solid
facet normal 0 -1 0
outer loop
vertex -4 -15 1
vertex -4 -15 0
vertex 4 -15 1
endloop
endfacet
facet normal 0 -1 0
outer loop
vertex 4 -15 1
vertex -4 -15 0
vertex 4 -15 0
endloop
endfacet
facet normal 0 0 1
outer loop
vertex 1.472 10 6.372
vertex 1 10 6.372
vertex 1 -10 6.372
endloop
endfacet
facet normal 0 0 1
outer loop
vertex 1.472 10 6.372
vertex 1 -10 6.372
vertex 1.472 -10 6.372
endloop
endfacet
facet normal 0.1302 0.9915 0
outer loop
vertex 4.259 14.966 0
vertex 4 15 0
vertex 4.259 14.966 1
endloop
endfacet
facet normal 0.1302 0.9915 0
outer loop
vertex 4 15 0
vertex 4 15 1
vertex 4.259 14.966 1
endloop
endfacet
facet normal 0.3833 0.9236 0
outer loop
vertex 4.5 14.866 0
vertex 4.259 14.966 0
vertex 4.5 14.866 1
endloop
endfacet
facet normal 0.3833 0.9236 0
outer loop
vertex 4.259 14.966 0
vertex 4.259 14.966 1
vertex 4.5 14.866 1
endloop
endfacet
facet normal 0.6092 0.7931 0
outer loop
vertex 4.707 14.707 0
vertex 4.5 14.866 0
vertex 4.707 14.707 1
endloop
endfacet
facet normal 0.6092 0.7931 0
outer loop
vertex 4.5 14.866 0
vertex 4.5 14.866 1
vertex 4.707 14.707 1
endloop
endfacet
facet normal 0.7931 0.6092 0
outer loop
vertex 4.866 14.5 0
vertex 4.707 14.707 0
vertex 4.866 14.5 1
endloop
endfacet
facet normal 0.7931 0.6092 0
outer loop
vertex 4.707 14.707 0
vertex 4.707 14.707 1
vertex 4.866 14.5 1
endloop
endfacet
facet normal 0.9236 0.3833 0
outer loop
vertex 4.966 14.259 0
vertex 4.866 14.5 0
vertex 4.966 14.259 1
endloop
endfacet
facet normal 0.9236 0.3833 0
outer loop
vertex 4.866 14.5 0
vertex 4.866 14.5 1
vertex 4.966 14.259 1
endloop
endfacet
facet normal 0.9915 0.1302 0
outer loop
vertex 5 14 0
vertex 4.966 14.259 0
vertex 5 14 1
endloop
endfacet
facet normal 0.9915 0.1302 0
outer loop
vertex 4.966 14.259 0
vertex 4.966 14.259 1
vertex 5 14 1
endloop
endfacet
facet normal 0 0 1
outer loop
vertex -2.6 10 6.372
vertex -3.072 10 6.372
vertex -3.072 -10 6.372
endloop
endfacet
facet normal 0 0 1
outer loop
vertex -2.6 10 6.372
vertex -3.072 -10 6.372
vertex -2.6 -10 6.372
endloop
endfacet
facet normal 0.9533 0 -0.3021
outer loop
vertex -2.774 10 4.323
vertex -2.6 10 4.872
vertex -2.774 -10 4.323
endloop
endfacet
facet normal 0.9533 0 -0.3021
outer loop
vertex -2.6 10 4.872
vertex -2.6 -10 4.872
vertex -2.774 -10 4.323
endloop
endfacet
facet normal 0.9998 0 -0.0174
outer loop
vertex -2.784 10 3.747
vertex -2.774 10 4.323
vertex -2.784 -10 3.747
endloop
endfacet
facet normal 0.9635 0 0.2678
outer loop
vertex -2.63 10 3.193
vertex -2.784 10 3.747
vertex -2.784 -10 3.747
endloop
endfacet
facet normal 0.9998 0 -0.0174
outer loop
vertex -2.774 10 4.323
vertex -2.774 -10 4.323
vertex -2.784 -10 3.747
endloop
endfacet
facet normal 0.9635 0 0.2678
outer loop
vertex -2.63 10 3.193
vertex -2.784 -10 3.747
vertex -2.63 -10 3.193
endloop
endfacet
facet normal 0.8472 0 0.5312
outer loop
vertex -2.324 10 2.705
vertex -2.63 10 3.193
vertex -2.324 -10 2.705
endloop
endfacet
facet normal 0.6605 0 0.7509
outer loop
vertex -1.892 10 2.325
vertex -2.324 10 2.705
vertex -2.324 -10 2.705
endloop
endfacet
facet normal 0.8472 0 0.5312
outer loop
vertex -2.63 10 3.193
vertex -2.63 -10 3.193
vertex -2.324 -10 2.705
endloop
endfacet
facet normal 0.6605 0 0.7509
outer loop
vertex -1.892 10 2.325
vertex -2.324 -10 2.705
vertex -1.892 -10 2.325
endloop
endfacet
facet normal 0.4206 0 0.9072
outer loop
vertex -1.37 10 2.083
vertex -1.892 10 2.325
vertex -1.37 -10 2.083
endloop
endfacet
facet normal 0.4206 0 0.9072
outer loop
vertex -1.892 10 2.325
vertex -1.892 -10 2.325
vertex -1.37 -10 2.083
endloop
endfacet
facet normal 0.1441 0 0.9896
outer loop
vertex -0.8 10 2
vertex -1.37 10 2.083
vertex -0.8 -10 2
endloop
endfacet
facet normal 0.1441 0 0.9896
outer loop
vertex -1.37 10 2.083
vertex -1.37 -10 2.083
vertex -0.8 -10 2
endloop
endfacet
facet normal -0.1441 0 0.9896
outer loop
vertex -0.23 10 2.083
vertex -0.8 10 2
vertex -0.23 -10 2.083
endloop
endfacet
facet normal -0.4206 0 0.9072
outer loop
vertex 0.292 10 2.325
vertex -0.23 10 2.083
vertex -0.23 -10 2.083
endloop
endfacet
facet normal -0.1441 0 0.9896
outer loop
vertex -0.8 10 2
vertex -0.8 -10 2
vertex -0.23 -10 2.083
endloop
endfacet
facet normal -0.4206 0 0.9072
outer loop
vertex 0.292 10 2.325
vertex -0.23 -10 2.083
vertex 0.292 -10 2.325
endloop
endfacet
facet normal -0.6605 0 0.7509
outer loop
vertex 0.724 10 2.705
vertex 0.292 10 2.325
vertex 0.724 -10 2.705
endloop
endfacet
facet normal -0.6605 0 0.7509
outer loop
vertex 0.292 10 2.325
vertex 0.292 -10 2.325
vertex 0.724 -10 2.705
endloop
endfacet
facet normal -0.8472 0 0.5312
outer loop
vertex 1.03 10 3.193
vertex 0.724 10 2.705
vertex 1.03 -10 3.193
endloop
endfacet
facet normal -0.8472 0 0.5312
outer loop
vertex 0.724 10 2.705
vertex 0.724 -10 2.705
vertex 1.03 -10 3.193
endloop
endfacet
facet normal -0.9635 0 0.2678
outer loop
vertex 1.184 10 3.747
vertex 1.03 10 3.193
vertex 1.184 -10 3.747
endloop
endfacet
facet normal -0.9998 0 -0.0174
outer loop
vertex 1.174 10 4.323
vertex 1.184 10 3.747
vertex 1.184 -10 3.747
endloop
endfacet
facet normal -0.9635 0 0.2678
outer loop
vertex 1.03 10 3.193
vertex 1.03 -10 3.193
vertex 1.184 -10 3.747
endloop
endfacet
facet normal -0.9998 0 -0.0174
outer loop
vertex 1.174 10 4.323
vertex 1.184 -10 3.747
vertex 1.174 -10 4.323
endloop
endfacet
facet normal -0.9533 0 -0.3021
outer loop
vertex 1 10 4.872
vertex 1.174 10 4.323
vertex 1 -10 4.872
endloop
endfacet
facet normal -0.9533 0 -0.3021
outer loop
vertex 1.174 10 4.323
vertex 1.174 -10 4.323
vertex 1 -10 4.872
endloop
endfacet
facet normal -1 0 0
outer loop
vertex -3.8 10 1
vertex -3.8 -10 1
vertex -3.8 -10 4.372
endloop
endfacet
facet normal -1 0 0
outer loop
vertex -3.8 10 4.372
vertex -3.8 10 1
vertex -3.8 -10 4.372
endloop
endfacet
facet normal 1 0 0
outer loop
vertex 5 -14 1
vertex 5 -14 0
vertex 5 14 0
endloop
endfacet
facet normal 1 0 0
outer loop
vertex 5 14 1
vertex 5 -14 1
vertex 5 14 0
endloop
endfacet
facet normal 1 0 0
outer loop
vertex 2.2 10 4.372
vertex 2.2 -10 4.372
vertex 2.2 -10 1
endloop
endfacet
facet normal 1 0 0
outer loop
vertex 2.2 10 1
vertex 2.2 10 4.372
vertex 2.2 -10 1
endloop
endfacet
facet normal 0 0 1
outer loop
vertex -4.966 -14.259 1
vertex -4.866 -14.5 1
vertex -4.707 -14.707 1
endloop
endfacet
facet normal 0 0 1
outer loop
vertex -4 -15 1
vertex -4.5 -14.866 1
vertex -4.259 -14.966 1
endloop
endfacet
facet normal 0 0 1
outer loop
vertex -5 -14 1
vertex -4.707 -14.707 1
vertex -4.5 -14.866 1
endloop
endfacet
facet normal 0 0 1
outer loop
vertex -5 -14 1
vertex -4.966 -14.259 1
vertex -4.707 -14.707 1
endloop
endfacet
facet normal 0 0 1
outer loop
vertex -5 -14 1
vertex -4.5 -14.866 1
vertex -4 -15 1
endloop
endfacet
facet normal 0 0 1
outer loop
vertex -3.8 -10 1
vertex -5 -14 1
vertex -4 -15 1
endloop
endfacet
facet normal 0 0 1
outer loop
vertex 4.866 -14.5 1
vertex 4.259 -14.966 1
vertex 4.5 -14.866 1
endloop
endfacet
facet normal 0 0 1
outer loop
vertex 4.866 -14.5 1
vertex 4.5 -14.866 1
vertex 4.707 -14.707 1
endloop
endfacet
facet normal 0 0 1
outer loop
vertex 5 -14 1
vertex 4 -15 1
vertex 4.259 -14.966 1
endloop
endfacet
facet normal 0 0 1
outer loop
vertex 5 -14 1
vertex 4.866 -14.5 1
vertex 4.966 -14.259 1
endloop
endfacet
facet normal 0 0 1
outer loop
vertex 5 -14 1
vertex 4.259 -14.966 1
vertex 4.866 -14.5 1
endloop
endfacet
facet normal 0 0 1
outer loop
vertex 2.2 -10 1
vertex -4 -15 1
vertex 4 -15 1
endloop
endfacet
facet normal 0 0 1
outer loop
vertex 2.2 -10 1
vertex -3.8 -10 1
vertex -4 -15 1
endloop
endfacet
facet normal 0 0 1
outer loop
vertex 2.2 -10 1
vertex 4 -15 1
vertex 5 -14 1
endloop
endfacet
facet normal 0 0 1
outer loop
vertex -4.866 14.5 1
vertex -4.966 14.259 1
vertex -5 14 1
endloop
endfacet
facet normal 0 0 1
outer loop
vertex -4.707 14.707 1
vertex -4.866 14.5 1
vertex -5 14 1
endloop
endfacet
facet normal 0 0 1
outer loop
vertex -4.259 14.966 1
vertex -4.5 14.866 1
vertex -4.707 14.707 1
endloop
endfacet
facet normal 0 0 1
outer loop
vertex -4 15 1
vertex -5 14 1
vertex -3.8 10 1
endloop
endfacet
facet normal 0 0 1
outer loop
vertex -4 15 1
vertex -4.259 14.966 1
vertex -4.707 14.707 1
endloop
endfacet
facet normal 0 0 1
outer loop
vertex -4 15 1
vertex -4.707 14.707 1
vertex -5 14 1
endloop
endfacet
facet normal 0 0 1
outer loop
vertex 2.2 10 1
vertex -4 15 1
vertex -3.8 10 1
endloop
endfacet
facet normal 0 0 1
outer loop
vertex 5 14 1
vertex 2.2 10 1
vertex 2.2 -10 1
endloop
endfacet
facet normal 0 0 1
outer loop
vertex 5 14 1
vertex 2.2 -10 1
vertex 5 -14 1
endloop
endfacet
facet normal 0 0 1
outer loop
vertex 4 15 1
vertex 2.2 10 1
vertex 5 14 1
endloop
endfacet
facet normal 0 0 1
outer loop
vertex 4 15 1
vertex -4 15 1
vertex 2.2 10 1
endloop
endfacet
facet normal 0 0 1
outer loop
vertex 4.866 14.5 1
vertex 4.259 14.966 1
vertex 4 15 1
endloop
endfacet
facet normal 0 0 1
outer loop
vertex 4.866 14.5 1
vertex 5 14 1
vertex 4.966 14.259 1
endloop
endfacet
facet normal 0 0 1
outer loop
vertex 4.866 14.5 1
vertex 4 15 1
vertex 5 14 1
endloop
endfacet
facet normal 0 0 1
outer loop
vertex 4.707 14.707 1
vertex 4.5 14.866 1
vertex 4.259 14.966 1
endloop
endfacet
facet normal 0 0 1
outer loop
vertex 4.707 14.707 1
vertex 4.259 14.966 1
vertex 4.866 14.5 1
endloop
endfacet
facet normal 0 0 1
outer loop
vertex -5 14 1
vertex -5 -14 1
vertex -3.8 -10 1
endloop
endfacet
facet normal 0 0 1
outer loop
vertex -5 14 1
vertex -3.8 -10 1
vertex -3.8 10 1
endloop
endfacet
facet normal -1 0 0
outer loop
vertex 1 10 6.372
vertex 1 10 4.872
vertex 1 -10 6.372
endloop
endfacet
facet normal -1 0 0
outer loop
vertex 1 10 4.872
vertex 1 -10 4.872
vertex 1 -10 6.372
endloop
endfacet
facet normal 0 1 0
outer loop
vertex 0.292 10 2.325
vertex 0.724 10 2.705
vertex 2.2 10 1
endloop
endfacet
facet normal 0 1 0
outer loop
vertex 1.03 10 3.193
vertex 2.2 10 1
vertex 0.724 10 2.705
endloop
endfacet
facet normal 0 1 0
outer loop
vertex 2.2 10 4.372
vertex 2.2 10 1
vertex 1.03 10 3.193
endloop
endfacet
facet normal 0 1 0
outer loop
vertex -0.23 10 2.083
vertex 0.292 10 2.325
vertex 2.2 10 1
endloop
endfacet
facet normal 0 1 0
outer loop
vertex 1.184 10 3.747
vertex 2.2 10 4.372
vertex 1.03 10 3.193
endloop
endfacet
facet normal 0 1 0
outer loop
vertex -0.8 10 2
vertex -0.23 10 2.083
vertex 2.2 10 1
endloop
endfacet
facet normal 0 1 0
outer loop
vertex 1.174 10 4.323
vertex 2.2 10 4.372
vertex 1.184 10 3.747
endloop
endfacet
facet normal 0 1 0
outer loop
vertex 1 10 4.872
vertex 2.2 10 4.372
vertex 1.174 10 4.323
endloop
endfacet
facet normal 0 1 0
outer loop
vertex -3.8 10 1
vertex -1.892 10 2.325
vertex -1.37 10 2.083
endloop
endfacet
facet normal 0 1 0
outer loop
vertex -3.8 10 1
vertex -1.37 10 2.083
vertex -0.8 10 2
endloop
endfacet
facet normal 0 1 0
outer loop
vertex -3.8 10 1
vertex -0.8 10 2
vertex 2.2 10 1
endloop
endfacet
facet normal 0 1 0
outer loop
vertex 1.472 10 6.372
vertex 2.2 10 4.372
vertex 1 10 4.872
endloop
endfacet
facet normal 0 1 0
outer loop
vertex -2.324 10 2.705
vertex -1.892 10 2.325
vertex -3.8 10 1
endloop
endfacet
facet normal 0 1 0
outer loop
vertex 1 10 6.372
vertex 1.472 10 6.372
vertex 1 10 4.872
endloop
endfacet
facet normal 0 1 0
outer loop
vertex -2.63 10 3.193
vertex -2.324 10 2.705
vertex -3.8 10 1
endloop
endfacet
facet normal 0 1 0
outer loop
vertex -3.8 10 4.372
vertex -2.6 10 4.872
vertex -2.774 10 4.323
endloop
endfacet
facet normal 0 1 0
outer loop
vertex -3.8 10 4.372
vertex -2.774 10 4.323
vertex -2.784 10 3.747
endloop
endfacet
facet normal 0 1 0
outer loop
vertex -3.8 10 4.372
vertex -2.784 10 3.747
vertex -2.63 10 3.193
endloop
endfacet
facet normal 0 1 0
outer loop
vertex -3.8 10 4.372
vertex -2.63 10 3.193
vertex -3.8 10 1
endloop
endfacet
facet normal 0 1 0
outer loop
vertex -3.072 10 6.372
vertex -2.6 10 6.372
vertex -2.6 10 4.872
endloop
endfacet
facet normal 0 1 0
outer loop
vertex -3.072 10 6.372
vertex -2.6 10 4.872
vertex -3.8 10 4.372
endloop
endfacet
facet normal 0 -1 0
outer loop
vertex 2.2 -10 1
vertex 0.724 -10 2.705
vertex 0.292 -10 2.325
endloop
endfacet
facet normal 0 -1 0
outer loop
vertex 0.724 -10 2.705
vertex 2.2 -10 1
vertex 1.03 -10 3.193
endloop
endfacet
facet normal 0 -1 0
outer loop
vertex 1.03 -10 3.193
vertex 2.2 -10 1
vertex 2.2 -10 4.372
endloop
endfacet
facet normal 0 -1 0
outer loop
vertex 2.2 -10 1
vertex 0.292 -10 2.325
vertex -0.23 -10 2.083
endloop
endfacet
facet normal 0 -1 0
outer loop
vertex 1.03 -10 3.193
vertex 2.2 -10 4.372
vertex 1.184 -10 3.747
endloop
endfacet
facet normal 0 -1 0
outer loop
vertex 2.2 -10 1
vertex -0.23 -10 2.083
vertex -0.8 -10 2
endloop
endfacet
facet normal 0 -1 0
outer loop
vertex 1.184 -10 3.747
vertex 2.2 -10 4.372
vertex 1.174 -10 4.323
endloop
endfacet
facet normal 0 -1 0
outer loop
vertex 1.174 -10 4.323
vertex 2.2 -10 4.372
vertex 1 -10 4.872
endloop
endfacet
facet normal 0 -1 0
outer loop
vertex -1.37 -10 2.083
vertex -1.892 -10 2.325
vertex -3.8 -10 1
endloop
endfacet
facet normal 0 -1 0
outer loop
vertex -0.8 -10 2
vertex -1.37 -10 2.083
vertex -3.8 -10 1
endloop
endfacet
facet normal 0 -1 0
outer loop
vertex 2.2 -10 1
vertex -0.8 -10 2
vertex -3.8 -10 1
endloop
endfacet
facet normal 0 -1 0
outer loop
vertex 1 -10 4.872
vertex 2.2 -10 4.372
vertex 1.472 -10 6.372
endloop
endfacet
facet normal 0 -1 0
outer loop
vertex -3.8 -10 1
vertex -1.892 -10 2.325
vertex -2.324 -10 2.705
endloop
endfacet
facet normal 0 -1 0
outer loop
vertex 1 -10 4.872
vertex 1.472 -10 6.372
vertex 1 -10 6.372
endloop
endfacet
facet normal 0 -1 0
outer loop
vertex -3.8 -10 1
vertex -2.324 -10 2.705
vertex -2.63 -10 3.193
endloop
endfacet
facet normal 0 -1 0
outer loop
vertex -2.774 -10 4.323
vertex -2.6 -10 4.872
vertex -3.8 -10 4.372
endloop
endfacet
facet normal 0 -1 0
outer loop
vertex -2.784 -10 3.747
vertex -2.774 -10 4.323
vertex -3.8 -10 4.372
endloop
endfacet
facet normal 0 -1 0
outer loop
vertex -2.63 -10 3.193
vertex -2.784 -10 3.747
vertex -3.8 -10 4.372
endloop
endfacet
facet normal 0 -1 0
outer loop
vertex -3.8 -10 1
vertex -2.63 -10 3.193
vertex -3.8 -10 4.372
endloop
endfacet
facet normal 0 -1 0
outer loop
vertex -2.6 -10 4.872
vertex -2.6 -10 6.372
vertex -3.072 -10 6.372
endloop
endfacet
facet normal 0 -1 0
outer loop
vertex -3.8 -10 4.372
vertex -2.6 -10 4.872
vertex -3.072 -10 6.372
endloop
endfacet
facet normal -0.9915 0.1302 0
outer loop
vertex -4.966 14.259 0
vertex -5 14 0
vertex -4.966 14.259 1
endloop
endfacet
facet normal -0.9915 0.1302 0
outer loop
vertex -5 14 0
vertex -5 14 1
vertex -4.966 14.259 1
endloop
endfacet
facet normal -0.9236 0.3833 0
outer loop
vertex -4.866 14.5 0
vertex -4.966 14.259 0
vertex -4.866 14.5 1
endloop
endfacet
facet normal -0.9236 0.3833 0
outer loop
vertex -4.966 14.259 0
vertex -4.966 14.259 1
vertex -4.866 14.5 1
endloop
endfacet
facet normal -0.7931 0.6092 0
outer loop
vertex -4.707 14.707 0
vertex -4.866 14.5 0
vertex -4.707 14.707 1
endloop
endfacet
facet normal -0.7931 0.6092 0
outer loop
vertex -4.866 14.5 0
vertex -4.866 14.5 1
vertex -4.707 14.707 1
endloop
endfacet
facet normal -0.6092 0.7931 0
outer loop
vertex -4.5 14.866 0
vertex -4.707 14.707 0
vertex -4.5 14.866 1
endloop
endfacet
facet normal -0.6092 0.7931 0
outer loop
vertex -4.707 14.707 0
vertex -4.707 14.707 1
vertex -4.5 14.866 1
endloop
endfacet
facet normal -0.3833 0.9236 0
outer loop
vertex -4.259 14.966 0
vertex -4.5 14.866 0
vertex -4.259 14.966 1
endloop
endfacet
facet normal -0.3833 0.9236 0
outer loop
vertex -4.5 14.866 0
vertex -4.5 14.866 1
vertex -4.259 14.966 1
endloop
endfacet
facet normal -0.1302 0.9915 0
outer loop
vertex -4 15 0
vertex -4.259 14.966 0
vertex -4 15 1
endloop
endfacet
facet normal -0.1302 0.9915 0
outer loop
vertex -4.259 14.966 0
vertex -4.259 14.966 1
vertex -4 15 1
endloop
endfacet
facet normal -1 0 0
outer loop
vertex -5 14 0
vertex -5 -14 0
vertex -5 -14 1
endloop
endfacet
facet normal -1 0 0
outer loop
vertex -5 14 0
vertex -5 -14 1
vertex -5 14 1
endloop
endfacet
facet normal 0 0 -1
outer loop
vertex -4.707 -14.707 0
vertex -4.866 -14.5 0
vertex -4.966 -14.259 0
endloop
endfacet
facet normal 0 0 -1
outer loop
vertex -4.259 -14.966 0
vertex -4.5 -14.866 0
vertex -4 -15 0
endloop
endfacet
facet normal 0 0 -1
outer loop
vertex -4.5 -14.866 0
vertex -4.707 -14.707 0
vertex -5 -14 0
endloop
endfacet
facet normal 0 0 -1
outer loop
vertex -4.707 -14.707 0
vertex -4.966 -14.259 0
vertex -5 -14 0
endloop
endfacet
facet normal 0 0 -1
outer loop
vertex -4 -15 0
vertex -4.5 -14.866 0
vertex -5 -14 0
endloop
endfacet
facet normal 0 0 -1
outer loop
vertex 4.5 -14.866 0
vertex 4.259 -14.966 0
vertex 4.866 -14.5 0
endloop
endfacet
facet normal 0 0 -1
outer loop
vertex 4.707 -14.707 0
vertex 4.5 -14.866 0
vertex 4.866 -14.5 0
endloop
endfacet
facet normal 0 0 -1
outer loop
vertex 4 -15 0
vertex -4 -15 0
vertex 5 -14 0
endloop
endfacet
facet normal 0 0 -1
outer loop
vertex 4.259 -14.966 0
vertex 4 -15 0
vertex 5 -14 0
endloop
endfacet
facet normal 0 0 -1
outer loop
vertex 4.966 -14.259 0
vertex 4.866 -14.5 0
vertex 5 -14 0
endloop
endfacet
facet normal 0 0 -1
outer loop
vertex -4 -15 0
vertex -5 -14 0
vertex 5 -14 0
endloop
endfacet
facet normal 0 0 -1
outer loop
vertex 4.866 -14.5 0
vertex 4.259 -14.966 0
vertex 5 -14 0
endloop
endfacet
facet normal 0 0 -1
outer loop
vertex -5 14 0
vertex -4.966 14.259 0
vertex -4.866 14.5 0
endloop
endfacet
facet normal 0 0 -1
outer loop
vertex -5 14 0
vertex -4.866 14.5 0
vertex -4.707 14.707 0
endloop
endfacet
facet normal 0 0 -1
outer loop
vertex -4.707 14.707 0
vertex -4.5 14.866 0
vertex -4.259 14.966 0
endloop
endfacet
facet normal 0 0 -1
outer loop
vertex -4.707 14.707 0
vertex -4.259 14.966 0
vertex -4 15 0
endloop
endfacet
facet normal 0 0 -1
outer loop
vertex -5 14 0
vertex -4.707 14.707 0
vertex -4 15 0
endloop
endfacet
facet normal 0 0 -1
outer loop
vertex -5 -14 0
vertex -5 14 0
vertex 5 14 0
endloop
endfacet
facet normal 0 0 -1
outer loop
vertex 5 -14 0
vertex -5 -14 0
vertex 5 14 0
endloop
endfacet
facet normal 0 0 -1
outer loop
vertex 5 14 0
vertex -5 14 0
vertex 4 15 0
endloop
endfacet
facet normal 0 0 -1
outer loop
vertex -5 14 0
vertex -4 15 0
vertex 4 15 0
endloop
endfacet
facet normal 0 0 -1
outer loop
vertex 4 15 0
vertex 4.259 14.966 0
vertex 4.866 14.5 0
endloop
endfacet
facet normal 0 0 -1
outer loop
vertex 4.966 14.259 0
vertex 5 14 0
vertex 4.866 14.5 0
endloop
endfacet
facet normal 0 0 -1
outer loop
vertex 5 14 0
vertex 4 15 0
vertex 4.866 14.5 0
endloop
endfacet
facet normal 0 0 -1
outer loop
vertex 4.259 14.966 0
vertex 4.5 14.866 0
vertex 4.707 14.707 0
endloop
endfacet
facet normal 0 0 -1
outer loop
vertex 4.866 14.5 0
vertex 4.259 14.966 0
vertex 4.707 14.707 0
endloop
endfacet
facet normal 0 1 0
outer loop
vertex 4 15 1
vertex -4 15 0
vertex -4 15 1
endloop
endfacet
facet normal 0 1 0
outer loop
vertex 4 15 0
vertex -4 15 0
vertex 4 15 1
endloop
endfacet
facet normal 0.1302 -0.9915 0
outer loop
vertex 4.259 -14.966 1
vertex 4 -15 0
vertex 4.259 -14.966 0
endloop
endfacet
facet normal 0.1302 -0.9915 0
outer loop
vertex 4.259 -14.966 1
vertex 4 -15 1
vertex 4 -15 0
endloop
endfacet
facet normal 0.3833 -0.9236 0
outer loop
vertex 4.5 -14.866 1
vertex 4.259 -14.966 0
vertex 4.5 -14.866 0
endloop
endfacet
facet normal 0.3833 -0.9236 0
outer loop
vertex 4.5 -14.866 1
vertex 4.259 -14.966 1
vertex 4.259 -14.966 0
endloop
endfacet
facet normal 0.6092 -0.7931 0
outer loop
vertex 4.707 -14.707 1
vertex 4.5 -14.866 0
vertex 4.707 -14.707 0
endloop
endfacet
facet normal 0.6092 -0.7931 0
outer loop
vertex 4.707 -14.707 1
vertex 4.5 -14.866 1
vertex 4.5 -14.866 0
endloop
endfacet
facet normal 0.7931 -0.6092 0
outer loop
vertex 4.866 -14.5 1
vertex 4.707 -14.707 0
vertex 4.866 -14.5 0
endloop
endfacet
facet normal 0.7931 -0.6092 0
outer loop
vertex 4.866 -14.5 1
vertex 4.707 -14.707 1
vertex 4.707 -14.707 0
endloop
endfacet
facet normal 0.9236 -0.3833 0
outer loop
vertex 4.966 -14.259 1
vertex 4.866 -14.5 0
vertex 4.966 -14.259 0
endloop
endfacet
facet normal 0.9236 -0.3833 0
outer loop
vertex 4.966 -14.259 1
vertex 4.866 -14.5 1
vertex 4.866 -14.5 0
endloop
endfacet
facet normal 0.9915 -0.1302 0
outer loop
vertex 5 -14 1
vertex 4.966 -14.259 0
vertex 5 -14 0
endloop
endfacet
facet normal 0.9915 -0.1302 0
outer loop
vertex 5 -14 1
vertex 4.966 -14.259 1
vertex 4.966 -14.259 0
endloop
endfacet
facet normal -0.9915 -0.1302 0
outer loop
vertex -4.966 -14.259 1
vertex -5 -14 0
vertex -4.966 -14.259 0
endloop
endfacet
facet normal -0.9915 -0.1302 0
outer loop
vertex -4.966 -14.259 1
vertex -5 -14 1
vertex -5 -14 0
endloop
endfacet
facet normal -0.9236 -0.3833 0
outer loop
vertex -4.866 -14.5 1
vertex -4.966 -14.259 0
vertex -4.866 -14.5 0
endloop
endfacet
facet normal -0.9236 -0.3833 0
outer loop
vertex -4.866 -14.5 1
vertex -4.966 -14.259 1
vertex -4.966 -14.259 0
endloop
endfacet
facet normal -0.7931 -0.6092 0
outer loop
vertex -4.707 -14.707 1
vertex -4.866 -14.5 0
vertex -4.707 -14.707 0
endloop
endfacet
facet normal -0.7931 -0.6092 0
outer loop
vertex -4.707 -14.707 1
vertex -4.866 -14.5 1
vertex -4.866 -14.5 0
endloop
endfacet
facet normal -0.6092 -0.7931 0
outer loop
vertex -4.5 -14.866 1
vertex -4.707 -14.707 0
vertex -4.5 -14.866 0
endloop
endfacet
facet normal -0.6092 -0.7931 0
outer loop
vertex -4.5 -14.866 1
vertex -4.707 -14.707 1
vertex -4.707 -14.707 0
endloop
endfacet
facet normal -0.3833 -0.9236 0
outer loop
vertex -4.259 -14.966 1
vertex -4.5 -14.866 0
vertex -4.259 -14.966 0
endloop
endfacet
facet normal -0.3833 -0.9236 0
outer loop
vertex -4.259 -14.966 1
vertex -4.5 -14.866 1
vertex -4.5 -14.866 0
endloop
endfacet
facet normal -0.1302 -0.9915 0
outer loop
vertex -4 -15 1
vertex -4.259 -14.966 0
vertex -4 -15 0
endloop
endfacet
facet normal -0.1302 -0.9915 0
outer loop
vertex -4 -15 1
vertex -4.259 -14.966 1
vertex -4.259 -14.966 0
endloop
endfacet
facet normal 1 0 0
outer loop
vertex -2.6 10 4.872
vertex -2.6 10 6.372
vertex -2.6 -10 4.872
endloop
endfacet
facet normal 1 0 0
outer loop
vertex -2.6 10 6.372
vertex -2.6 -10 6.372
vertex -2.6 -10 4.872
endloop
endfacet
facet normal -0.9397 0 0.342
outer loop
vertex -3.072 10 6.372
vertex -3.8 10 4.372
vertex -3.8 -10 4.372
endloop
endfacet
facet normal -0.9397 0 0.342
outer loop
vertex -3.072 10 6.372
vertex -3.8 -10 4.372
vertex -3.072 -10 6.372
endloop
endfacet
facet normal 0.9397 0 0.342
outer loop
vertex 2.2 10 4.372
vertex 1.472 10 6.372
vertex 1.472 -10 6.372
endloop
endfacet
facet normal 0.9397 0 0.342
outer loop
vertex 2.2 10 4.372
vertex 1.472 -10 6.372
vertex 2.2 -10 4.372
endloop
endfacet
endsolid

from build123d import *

# Parameters (mm, degrees)
SKETCH1_W           = 10
SKETCH1_H           = 30
BOSS_EXTRUDE1_DEPTH = 1
BOSS_EXTRUDE2_DEPTH = 10
FILLET1_R           = 1


with BuildPart() as part:
    # Sketch1 → Boss-Extrude1 (new body)
    with BuildSketch(Plane.XY):
        Rectangle(SKETCH1_W, SKETCH1_H)
    extrude(amount=BOSS_EXTRUDE1_DEPTH)

    # Sketch3 → Boss-Extrude2 (add, symmetric)
    with BuildSketch(Plane.XZ):
        with BuildLine():
            Line((-3.8, 1), (-3.8, 4.371779789))
            Line((-3.8, 4.371779789), (-3.072059531, 6.371779789))
            Line((-3.072059531, 6.371779789), (-2.6, 6.371779789))
            Line((-2.6, 6.371779789), (-2.6, 4.871779789))
            ThreePointArc((-2.6, 4.871779789), (-0.8, 2), (1, 4.871779789))
            Line((1, 4.871779789), (1, 6.371779789))
            Line((1, 6.371779789), (1.472059531, 6.371779789))
            Line((1.472059531, 6.371779789), (2.2, 4.371779789))
            Line((2.2, 4.371779789), (2.2, 1))
            Line((2.2, 1), (-3.8, 1))
        make_face()
    extrude(amount=BOSS_EXTRUDE2_DEPTH, both=True)

    # Fillet1
    fillet1_edges = [part.edges().sort_by_distance(p)[0] for p in [
        (-5, 15, 0.5),
        (5, 15, 0.5),
        (5, -15, 0.5),
        (-5, -15, 0.5),
    ]]
    fillet(fillet1_edges, radius=FILLET1_R)


solid = part.part
